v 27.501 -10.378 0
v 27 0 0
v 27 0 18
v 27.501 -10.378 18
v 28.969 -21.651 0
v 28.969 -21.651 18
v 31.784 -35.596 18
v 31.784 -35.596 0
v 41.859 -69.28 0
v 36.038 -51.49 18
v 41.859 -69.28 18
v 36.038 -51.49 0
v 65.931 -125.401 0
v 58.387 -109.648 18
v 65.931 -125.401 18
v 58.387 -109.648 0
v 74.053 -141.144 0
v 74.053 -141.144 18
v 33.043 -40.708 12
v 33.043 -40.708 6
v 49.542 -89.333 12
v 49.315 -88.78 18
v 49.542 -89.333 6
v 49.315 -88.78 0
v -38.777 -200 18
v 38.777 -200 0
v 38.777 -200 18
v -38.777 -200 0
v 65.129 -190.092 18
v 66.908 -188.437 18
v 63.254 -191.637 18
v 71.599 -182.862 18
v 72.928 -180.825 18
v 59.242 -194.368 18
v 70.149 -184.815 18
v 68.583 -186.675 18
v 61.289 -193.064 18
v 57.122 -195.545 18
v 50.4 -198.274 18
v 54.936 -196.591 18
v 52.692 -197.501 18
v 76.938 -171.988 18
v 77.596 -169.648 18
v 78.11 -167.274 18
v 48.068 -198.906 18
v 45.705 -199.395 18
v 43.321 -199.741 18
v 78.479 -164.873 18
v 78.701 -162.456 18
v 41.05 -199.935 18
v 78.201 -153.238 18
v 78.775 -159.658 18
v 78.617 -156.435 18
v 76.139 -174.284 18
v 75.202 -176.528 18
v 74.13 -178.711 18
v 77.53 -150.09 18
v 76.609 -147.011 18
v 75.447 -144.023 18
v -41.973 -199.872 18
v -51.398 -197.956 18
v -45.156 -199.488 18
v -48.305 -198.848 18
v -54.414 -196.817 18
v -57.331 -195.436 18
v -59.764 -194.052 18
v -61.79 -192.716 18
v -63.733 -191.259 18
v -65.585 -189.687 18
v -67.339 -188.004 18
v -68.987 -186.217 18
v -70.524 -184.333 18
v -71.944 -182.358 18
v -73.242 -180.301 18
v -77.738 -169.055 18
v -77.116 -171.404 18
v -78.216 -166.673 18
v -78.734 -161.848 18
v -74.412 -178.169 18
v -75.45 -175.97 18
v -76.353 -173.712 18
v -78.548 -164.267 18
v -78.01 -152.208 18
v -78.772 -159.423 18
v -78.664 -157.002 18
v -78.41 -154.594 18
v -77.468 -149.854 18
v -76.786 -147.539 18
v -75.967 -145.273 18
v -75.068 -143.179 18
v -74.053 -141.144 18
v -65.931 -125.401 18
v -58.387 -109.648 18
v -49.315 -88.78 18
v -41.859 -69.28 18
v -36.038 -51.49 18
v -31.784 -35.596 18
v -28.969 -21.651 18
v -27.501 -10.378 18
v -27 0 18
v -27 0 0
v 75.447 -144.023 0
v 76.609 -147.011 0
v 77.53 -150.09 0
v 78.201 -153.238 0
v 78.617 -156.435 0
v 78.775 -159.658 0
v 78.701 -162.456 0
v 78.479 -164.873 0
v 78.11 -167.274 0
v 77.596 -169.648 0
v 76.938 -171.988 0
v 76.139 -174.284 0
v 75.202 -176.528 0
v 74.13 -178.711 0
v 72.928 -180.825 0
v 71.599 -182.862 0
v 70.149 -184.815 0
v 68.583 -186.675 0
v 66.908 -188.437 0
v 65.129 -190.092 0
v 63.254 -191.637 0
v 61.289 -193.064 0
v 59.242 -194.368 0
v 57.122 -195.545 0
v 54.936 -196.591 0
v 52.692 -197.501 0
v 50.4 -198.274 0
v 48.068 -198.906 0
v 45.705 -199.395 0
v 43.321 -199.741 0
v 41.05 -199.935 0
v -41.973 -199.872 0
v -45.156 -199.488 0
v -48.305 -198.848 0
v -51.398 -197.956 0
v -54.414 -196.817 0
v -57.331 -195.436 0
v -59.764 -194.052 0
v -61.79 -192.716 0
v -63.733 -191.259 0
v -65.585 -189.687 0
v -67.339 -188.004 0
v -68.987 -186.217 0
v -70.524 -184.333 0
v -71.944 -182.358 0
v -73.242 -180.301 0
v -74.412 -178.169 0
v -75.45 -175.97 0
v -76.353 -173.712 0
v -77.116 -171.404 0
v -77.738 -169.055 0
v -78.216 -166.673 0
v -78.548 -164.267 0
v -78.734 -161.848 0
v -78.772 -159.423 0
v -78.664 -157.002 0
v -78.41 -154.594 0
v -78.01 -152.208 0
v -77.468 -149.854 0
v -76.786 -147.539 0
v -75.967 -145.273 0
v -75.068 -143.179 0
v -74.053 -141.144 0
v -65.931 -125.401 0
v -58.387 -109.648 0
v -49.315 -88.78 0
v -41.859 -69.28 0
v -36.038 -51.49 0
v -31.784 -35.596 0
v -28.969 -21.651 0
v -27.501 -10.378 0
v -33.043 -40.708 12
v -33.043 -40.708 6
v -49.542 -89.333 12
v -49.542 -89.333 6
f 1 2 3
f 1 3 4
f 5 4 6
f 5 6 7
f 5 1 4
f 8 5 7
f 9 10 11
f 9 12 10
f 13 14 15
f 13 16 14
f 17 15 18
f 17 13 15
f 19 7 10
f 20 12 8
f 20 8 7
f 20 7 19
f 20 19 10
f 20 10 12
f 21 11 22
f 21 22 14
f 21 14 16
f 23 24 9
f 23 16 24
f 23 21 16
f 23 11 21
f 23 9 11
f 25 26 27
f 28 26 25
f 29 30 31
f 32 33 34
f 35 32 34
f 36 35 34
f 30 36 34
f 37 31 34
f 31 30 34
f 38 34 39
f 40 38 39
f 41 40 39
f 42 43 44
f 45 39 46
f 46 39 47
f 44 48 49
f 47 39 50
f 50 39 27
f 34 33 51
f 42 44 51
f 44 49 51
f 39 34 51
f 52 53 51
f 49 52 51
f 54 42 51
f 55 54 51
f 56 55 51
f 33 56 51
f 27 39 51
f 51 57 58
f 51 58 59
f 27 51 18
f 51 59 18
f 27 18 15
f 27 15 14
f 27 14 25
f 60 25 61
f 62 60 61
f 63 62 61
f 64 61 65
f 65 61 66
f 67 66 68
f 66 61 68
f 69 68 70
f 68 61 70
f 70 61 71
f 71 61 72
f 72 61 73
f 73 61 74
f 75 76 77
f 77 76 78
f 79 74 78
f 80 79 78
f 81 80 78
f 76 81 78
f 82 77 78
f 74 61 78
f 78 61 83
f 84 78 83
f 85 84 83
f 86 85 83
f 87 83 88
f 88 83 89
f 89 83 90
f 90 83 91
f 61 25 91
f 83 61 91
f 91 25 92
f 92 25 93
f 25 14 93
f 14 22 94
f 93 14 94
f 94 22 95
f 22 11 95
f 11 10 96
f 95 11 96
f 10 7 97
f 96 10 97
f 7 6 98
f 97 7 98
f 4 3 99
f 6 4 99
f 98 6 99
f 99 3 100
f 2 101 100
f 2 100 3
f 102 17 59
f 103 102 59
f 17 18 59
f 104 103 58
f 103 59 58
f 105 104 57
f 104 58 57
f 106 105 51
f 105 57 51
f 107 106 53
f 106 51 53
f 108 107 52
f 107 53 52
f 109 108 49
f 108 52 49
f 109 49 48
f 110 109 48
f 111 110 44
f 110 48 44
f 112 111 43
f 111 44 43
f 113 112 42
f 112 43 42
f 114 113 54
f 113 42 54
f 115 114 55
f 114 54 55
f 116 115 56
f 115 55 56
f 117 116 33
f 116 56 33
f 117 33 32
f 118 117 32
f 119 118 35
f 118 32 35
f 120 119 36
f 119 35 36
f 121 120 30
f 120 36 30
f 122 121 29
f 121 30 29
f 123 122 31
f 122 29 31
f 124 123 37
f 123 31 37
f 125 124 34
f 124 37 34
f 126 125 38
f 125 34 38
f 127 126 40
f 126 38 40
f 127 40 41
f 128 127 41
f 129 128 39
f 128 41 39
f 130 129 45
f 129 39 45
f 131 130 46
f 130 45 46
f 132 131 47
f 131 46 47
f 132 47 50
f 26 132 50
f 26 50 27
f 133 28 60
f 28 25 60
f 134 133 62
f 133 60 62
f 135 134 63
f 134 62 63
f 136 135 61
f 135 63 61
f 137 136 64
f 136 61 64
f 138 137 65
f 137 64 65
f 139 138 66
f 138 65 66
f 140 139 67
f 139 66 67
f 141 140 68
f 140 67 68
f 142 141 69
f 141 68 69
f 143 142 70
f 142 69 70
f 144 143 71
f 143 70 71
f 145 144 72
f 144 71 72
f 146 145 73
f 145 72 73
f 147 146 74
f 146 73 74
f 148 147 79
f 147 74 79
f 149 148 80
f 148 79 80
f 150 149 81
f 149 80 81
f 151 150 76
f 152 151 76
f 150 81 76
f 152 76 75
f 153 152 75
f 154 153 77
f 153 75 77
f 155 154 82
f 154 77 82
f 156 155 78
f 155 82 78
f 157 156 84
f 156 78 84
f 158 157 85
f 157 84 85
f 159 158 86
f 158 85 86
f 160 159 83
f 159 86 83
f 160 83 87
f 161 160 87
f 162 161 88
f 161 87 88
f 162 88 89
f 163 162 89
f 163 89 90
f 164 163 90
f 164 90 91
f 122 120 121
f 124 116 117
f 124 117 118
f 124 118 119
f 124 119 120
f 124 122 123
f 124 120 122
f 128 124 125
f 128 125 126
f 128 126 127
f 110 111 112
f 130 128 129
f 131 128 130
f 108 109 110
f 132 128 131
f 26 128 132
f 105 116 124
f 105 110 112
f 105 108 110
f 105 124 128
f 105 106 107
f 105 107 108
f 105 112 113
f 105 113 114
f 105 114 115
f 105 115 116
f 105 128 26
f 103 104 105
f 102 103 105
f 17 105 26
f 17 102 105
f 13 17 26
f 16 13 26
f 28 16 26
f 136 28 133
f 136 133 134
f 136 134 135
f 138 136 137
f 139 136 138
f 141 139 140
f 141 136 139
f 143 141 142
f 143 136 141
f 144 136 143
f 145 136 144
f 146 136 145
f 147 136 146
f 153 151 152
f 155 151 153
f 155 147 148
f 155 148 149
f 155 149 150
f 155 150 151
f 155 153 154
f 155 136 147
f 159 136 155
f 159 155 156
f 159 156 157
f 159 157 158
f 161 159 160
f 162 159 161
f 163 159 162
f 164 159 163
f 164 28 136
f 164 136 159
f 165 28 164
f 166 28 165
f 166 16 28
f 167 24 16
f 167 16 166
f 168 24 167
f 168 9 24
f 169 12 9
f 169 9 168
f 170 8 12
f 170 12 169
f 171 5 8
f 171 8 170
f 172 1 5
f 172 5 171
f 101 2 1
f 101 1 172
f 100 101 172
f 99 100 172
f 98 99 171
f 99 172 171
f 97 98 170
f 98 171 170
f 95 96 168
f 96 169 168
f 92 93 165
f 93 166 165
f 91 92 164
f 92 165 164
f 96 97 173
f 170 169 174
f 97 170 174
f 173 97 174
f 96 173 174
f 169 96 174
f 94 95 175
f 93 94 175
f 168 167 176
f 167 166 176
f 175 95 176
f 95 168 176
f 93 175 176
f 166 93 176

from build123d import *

# Parameters (mm, degrees)
BOSS_EXTRUDE1_DEPTH = 18
FILLET1_R           = 40


with BuildPart() as part:
    # Sketch1 → Boss-Extrude1 (new body)
    with BuildSketch(Plane.XY):
        with BuildLine():
            Line((-27, 0), (27, 0))
            add(Edge.make_bspline(
                [(27, 0), (27, -49.026425591), (64.594351551, -134.908704781), (110, -200)],
                knots=[0, 0, 0, 0, 1, 1, 1, 1], degree=3))
            Line((110, -200), (-110, -200))
            add(Edge.make_bspline(
                [(-27, 0), (-27, -49.026425591), (-64.594351551, -134.908704781), (-110, -200)],
                knots=[0, 0, 0, 0, 1, 1, 1, 1], degree=3))
        make_face()
    extrude(amount=BOSS_EXTRUDE1_DEPTH)

    # Fillet1
    fillet1_edges = [part.edges().sort_by_distance(p)[0] for p in [
        (-110, -200, 9),
        (110, -200, 9),
    ]]
    fillet(fillet1_edges, radius=FILLET1_R)


solid = part.part
